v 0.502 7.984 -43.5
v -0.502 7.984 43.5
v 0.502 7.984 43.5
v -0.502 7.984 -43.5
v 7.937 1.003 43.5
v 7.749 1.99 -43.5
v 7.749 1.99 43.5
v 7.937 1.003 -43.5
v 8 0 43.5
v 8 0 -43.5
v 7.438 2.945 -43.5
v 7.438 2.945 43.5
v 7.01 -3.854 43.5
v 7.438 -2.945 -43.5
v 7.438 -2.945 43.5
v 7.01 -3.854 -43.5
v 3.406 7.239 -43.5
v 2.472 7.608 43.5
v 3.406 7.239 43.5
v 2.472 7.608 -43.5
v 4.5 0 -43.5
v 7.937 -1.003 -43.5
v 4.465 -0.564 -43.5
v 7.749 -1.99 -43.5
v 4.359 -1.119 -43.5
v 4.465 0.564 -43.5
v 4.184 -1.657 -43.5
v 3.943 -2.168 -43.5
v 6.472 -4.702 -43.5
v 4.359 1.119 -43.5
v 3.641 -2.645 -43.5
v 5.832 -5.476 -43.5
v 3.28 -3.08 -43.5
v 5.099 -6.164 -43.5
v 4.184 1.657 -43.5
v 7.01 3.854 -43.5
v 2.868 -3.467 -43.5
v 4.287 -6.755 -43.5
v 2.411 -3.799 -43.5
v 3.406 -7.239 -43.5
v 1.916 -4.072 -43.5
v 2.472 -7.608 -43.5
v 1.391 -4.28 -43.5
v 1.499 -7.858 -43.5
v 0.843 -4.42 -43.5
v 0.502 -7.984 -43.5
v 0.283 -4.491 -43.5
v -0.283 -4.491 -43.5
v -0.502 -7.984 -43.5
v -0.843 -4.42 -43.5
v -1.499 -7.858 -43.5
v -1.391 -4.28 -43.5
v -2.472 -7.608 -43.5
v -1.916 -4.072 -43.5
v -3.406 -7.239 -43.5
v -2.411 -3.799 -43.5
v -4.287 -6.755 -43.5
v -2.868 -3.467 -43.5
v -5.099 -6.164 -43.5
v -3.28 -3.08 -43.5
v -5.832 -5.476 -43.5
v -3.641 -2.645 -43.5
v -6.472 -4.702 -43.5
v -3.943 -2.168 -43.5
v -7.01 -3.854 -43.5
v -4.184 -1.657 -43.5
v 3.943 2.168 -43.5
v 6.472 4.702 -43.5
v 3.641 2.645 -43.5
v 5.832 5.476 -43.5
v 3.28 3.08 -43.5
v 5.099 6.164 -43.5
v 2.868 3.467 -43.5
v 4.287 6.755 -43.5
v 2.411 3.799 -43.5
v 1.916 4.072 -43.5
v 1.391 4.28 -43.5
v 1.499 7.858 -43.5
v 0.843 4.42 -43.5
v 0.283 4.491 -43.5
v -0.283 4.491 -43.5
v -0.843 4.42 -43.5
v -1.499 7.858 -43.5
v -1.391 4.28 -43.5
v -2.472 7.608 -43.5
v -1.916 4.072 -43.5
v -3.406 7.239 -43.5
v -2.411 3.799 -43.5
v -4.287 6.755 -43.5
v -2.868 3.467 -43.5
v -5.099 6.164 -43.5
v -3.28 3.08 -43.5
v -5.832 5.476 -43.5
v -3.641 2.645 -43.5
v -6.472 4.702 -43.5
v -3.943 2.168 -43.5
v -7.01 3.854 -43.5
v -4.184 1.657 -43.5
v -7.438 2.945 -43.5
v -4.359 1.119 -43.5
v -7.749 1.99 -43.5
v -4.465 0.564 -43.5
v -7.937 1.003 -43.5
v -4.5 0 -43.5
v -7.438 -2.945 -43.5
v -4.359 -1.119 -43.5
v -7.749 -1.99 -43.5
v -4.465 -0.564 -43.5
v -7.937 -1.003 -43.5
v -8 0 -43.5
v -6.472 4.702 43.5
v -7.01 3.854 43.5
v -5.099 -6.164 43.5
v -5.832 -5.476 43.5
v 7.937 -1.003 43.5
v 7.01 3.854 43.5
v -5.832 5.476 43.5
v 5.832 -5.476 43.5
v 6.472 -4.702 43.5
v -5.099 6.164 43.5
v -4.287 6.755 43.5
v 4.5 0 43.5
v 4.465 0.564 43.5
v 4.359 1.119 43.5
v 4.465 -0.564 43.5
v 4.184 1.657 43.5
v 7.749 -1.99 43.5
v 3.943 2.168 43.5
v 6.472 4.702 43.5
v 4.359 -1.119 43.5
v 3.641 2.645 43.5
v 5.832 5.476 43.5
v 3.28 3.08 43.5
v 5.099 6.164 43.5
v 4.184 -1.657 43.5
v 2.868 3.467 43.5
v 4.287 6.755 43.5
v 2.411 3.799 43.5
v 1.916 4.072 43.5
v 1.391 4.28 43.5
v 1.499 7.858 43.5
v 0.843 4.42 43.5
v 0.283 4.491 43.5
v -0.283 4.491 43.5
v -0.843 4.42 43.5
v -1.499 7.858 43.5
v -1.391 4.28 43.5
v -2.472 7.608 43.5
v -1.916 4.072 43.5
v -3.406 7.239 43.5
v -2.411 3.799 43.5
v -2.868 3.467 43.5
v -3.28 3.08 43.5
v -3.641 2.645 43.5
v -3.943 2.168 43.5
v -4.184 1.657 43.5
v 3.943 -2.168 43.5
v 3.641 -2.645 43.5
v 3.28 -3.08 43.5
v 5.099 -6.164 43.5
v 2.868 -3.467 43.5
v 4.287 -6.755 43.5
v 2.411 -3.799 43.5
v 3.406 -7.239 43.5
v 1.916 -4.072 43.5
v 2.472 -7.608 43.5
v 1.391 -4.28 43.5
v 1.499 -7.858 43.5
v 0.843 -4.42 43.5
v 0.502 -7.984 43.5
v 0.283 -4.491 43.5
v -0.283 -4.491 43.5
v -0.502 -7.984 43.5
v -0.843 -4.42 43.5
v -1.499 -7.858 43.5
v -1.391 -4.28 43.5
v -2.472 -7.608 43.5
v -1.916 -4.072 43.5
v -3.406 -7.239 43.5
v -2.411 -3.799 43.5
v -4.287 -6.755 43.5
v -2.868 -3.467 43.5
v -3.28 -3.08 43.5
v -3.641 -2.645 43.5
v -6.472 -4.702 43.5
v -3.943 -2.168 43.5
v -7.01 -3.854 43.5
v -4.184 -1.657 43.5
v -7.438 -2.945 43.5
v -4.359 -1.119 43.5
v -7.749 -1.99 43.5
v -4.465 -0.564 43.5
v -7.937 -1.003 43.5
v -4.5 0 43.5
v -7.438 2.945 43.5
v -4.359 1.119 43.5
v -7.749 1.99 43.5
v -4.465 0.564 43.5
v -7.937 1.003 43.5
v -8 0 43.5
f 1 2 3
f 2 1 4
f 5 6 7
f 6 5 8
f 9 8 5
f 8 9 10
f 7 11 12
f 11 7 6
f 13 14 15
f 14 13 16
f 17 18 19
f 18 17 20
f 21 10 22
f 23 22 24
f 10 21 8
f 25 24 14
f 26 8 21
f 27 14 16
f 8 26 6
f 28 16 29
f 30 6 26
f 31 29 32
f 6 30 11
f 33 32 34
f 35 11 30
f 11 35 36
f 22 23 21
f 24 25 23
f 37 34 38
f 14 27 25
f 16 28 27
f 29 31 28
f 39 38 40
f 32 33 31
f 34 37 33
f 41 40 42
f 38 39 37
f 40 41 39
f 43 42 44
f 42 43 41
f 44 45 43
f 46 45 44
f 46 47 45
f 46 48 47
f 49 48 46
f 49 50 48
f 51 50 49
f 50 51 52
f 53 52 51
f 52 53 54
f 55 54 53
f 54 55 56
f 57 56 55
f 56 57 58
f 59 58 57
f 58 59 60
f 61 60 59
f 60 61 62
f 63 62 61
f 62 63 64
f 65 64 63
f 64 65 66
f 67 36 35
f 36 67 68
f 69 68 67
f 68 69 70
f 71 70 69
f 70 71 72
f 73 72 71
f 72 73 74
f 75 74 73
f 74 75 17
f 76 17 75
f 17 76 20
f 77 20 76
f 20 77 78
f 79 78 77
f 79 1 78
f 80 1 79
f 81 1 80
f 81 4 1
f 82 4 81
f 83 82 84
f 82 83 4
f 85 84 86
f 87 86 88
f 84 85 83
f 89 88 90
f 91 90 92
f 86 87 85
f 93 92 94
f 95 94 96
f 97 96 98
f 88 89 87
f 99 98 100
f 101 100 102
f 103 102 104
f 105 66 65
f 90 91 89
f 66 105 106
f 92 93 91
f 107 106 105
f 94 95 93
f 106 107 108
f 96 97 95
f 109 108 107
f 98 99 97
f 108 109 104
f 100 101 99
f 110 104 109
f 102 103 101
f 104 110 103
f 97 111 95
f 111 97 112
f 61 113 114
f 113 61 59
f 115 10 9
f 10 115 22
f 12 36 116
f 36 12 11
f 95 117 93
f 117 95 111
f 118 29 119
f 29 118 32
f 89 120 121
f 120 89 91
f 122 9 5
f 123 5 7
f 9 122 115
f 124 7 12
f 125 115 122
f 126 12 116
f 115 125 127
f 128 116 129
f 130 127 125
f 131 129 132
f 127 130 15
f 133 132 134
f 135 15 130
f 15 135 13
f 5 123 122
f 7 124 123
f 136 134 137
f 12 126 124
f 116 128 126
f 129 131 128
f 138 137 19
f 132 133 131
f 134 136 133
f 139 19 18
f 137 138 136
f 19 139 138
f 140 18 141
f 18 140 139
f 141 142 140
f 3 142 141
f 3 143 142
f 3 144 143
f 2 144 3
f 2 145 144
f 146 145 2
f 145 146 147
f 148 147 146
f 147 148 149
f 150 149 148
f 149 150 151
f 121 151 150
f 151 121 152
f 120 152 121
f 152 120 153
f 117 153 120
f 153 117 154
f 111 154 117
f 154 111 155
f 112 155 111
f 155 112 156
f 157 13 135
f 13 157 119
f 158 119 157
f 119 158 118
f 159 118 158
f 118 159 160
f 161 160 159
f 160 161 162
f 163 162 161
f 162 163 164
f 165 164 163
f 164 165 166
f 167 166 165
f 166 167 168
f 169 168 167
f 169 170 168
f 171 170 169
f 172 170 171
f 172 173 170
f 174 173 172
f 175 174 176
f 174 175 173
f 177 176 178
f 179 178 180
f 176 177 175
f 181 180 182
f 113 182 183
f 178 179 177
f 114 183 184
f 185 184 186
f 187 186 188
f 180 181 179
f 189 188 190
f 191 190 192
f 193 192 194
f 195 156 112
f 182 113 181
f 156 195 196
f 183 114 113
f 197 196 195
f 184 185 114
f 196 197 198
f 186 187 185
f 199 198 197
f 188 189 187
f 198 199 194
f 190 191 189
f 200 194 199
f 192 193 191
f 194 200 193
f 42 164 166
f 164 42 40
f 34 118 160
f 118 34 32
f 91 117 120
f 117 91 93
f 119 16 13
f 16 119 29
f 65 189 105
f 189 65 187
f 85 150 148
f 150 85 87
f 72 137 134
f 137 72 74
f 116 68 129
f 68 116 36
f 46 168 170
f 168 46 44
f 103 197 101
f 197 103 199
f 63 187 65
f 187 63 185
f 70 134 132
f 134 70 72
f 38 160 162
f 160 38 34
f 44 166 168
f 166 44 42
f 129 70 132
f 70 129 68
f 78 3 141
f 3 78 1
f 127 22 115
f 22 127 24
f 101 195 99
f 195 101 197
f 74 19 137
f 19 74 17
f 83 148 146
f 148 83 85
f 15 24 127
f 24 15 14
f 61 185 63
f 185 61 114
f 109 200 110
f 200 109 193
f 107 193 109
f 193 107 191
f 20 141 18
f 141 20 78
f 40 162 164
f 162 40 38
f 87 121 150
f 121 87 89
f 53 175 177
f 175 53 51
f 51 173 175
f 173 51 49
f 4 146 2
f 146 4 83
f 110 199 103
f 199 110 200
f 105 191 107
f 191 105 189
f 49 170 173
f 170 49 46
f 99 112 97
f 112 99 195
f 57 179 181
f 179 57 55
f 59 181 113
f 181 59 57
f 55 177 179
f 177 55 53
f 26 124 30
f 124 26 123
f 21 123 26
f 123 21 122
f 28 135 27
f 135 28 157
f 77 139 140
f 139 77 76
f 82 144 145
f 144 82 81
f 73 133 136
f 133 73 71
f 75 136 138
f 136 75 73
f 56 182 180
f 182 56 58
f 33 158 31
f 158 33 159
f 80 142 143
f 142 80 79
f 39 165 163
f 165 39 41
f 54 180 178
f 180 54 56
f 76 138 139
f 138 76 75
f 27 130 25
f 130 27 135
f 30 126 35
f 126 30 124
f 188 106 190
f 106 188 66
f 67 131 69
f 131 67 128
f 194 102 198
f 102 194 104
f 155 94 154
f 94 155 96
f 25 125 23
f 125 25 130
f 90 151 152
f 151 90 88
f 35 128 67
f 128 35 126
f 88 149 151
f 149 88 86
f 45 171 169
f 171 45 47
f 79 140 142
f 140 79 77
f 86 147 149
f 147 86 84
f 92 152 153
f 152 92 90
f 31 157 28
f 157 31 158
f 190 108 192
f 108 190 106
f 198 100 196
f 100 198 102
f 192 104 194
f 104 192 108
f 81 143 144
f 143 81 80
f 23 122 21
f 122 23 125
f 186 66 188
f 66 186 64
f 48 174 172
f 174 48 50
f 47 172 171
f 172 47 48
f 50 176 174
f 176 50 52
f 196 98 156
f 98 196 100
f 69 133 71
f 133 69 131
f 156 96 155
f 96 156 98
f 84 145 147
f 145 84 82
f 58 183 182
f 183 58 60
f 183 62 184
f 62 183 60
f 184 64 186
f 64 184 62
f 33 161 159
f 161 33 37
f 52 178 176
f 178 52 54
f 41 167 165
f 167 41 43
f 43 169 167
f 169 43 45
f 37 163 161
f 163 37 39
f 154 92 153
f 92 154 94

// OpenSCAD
$fn = 50;


difference() {
	union() {
		translate(v = [0, 0, -43.5000000000]) {
			cylinder(h = 87, r = 8.0000000000);
		}
	}
	union() {
		translate(v = [0, 0, -100.0000000000]) {
			cylinder(h = 200, r = 4.5000000000);
		}
	}
}
